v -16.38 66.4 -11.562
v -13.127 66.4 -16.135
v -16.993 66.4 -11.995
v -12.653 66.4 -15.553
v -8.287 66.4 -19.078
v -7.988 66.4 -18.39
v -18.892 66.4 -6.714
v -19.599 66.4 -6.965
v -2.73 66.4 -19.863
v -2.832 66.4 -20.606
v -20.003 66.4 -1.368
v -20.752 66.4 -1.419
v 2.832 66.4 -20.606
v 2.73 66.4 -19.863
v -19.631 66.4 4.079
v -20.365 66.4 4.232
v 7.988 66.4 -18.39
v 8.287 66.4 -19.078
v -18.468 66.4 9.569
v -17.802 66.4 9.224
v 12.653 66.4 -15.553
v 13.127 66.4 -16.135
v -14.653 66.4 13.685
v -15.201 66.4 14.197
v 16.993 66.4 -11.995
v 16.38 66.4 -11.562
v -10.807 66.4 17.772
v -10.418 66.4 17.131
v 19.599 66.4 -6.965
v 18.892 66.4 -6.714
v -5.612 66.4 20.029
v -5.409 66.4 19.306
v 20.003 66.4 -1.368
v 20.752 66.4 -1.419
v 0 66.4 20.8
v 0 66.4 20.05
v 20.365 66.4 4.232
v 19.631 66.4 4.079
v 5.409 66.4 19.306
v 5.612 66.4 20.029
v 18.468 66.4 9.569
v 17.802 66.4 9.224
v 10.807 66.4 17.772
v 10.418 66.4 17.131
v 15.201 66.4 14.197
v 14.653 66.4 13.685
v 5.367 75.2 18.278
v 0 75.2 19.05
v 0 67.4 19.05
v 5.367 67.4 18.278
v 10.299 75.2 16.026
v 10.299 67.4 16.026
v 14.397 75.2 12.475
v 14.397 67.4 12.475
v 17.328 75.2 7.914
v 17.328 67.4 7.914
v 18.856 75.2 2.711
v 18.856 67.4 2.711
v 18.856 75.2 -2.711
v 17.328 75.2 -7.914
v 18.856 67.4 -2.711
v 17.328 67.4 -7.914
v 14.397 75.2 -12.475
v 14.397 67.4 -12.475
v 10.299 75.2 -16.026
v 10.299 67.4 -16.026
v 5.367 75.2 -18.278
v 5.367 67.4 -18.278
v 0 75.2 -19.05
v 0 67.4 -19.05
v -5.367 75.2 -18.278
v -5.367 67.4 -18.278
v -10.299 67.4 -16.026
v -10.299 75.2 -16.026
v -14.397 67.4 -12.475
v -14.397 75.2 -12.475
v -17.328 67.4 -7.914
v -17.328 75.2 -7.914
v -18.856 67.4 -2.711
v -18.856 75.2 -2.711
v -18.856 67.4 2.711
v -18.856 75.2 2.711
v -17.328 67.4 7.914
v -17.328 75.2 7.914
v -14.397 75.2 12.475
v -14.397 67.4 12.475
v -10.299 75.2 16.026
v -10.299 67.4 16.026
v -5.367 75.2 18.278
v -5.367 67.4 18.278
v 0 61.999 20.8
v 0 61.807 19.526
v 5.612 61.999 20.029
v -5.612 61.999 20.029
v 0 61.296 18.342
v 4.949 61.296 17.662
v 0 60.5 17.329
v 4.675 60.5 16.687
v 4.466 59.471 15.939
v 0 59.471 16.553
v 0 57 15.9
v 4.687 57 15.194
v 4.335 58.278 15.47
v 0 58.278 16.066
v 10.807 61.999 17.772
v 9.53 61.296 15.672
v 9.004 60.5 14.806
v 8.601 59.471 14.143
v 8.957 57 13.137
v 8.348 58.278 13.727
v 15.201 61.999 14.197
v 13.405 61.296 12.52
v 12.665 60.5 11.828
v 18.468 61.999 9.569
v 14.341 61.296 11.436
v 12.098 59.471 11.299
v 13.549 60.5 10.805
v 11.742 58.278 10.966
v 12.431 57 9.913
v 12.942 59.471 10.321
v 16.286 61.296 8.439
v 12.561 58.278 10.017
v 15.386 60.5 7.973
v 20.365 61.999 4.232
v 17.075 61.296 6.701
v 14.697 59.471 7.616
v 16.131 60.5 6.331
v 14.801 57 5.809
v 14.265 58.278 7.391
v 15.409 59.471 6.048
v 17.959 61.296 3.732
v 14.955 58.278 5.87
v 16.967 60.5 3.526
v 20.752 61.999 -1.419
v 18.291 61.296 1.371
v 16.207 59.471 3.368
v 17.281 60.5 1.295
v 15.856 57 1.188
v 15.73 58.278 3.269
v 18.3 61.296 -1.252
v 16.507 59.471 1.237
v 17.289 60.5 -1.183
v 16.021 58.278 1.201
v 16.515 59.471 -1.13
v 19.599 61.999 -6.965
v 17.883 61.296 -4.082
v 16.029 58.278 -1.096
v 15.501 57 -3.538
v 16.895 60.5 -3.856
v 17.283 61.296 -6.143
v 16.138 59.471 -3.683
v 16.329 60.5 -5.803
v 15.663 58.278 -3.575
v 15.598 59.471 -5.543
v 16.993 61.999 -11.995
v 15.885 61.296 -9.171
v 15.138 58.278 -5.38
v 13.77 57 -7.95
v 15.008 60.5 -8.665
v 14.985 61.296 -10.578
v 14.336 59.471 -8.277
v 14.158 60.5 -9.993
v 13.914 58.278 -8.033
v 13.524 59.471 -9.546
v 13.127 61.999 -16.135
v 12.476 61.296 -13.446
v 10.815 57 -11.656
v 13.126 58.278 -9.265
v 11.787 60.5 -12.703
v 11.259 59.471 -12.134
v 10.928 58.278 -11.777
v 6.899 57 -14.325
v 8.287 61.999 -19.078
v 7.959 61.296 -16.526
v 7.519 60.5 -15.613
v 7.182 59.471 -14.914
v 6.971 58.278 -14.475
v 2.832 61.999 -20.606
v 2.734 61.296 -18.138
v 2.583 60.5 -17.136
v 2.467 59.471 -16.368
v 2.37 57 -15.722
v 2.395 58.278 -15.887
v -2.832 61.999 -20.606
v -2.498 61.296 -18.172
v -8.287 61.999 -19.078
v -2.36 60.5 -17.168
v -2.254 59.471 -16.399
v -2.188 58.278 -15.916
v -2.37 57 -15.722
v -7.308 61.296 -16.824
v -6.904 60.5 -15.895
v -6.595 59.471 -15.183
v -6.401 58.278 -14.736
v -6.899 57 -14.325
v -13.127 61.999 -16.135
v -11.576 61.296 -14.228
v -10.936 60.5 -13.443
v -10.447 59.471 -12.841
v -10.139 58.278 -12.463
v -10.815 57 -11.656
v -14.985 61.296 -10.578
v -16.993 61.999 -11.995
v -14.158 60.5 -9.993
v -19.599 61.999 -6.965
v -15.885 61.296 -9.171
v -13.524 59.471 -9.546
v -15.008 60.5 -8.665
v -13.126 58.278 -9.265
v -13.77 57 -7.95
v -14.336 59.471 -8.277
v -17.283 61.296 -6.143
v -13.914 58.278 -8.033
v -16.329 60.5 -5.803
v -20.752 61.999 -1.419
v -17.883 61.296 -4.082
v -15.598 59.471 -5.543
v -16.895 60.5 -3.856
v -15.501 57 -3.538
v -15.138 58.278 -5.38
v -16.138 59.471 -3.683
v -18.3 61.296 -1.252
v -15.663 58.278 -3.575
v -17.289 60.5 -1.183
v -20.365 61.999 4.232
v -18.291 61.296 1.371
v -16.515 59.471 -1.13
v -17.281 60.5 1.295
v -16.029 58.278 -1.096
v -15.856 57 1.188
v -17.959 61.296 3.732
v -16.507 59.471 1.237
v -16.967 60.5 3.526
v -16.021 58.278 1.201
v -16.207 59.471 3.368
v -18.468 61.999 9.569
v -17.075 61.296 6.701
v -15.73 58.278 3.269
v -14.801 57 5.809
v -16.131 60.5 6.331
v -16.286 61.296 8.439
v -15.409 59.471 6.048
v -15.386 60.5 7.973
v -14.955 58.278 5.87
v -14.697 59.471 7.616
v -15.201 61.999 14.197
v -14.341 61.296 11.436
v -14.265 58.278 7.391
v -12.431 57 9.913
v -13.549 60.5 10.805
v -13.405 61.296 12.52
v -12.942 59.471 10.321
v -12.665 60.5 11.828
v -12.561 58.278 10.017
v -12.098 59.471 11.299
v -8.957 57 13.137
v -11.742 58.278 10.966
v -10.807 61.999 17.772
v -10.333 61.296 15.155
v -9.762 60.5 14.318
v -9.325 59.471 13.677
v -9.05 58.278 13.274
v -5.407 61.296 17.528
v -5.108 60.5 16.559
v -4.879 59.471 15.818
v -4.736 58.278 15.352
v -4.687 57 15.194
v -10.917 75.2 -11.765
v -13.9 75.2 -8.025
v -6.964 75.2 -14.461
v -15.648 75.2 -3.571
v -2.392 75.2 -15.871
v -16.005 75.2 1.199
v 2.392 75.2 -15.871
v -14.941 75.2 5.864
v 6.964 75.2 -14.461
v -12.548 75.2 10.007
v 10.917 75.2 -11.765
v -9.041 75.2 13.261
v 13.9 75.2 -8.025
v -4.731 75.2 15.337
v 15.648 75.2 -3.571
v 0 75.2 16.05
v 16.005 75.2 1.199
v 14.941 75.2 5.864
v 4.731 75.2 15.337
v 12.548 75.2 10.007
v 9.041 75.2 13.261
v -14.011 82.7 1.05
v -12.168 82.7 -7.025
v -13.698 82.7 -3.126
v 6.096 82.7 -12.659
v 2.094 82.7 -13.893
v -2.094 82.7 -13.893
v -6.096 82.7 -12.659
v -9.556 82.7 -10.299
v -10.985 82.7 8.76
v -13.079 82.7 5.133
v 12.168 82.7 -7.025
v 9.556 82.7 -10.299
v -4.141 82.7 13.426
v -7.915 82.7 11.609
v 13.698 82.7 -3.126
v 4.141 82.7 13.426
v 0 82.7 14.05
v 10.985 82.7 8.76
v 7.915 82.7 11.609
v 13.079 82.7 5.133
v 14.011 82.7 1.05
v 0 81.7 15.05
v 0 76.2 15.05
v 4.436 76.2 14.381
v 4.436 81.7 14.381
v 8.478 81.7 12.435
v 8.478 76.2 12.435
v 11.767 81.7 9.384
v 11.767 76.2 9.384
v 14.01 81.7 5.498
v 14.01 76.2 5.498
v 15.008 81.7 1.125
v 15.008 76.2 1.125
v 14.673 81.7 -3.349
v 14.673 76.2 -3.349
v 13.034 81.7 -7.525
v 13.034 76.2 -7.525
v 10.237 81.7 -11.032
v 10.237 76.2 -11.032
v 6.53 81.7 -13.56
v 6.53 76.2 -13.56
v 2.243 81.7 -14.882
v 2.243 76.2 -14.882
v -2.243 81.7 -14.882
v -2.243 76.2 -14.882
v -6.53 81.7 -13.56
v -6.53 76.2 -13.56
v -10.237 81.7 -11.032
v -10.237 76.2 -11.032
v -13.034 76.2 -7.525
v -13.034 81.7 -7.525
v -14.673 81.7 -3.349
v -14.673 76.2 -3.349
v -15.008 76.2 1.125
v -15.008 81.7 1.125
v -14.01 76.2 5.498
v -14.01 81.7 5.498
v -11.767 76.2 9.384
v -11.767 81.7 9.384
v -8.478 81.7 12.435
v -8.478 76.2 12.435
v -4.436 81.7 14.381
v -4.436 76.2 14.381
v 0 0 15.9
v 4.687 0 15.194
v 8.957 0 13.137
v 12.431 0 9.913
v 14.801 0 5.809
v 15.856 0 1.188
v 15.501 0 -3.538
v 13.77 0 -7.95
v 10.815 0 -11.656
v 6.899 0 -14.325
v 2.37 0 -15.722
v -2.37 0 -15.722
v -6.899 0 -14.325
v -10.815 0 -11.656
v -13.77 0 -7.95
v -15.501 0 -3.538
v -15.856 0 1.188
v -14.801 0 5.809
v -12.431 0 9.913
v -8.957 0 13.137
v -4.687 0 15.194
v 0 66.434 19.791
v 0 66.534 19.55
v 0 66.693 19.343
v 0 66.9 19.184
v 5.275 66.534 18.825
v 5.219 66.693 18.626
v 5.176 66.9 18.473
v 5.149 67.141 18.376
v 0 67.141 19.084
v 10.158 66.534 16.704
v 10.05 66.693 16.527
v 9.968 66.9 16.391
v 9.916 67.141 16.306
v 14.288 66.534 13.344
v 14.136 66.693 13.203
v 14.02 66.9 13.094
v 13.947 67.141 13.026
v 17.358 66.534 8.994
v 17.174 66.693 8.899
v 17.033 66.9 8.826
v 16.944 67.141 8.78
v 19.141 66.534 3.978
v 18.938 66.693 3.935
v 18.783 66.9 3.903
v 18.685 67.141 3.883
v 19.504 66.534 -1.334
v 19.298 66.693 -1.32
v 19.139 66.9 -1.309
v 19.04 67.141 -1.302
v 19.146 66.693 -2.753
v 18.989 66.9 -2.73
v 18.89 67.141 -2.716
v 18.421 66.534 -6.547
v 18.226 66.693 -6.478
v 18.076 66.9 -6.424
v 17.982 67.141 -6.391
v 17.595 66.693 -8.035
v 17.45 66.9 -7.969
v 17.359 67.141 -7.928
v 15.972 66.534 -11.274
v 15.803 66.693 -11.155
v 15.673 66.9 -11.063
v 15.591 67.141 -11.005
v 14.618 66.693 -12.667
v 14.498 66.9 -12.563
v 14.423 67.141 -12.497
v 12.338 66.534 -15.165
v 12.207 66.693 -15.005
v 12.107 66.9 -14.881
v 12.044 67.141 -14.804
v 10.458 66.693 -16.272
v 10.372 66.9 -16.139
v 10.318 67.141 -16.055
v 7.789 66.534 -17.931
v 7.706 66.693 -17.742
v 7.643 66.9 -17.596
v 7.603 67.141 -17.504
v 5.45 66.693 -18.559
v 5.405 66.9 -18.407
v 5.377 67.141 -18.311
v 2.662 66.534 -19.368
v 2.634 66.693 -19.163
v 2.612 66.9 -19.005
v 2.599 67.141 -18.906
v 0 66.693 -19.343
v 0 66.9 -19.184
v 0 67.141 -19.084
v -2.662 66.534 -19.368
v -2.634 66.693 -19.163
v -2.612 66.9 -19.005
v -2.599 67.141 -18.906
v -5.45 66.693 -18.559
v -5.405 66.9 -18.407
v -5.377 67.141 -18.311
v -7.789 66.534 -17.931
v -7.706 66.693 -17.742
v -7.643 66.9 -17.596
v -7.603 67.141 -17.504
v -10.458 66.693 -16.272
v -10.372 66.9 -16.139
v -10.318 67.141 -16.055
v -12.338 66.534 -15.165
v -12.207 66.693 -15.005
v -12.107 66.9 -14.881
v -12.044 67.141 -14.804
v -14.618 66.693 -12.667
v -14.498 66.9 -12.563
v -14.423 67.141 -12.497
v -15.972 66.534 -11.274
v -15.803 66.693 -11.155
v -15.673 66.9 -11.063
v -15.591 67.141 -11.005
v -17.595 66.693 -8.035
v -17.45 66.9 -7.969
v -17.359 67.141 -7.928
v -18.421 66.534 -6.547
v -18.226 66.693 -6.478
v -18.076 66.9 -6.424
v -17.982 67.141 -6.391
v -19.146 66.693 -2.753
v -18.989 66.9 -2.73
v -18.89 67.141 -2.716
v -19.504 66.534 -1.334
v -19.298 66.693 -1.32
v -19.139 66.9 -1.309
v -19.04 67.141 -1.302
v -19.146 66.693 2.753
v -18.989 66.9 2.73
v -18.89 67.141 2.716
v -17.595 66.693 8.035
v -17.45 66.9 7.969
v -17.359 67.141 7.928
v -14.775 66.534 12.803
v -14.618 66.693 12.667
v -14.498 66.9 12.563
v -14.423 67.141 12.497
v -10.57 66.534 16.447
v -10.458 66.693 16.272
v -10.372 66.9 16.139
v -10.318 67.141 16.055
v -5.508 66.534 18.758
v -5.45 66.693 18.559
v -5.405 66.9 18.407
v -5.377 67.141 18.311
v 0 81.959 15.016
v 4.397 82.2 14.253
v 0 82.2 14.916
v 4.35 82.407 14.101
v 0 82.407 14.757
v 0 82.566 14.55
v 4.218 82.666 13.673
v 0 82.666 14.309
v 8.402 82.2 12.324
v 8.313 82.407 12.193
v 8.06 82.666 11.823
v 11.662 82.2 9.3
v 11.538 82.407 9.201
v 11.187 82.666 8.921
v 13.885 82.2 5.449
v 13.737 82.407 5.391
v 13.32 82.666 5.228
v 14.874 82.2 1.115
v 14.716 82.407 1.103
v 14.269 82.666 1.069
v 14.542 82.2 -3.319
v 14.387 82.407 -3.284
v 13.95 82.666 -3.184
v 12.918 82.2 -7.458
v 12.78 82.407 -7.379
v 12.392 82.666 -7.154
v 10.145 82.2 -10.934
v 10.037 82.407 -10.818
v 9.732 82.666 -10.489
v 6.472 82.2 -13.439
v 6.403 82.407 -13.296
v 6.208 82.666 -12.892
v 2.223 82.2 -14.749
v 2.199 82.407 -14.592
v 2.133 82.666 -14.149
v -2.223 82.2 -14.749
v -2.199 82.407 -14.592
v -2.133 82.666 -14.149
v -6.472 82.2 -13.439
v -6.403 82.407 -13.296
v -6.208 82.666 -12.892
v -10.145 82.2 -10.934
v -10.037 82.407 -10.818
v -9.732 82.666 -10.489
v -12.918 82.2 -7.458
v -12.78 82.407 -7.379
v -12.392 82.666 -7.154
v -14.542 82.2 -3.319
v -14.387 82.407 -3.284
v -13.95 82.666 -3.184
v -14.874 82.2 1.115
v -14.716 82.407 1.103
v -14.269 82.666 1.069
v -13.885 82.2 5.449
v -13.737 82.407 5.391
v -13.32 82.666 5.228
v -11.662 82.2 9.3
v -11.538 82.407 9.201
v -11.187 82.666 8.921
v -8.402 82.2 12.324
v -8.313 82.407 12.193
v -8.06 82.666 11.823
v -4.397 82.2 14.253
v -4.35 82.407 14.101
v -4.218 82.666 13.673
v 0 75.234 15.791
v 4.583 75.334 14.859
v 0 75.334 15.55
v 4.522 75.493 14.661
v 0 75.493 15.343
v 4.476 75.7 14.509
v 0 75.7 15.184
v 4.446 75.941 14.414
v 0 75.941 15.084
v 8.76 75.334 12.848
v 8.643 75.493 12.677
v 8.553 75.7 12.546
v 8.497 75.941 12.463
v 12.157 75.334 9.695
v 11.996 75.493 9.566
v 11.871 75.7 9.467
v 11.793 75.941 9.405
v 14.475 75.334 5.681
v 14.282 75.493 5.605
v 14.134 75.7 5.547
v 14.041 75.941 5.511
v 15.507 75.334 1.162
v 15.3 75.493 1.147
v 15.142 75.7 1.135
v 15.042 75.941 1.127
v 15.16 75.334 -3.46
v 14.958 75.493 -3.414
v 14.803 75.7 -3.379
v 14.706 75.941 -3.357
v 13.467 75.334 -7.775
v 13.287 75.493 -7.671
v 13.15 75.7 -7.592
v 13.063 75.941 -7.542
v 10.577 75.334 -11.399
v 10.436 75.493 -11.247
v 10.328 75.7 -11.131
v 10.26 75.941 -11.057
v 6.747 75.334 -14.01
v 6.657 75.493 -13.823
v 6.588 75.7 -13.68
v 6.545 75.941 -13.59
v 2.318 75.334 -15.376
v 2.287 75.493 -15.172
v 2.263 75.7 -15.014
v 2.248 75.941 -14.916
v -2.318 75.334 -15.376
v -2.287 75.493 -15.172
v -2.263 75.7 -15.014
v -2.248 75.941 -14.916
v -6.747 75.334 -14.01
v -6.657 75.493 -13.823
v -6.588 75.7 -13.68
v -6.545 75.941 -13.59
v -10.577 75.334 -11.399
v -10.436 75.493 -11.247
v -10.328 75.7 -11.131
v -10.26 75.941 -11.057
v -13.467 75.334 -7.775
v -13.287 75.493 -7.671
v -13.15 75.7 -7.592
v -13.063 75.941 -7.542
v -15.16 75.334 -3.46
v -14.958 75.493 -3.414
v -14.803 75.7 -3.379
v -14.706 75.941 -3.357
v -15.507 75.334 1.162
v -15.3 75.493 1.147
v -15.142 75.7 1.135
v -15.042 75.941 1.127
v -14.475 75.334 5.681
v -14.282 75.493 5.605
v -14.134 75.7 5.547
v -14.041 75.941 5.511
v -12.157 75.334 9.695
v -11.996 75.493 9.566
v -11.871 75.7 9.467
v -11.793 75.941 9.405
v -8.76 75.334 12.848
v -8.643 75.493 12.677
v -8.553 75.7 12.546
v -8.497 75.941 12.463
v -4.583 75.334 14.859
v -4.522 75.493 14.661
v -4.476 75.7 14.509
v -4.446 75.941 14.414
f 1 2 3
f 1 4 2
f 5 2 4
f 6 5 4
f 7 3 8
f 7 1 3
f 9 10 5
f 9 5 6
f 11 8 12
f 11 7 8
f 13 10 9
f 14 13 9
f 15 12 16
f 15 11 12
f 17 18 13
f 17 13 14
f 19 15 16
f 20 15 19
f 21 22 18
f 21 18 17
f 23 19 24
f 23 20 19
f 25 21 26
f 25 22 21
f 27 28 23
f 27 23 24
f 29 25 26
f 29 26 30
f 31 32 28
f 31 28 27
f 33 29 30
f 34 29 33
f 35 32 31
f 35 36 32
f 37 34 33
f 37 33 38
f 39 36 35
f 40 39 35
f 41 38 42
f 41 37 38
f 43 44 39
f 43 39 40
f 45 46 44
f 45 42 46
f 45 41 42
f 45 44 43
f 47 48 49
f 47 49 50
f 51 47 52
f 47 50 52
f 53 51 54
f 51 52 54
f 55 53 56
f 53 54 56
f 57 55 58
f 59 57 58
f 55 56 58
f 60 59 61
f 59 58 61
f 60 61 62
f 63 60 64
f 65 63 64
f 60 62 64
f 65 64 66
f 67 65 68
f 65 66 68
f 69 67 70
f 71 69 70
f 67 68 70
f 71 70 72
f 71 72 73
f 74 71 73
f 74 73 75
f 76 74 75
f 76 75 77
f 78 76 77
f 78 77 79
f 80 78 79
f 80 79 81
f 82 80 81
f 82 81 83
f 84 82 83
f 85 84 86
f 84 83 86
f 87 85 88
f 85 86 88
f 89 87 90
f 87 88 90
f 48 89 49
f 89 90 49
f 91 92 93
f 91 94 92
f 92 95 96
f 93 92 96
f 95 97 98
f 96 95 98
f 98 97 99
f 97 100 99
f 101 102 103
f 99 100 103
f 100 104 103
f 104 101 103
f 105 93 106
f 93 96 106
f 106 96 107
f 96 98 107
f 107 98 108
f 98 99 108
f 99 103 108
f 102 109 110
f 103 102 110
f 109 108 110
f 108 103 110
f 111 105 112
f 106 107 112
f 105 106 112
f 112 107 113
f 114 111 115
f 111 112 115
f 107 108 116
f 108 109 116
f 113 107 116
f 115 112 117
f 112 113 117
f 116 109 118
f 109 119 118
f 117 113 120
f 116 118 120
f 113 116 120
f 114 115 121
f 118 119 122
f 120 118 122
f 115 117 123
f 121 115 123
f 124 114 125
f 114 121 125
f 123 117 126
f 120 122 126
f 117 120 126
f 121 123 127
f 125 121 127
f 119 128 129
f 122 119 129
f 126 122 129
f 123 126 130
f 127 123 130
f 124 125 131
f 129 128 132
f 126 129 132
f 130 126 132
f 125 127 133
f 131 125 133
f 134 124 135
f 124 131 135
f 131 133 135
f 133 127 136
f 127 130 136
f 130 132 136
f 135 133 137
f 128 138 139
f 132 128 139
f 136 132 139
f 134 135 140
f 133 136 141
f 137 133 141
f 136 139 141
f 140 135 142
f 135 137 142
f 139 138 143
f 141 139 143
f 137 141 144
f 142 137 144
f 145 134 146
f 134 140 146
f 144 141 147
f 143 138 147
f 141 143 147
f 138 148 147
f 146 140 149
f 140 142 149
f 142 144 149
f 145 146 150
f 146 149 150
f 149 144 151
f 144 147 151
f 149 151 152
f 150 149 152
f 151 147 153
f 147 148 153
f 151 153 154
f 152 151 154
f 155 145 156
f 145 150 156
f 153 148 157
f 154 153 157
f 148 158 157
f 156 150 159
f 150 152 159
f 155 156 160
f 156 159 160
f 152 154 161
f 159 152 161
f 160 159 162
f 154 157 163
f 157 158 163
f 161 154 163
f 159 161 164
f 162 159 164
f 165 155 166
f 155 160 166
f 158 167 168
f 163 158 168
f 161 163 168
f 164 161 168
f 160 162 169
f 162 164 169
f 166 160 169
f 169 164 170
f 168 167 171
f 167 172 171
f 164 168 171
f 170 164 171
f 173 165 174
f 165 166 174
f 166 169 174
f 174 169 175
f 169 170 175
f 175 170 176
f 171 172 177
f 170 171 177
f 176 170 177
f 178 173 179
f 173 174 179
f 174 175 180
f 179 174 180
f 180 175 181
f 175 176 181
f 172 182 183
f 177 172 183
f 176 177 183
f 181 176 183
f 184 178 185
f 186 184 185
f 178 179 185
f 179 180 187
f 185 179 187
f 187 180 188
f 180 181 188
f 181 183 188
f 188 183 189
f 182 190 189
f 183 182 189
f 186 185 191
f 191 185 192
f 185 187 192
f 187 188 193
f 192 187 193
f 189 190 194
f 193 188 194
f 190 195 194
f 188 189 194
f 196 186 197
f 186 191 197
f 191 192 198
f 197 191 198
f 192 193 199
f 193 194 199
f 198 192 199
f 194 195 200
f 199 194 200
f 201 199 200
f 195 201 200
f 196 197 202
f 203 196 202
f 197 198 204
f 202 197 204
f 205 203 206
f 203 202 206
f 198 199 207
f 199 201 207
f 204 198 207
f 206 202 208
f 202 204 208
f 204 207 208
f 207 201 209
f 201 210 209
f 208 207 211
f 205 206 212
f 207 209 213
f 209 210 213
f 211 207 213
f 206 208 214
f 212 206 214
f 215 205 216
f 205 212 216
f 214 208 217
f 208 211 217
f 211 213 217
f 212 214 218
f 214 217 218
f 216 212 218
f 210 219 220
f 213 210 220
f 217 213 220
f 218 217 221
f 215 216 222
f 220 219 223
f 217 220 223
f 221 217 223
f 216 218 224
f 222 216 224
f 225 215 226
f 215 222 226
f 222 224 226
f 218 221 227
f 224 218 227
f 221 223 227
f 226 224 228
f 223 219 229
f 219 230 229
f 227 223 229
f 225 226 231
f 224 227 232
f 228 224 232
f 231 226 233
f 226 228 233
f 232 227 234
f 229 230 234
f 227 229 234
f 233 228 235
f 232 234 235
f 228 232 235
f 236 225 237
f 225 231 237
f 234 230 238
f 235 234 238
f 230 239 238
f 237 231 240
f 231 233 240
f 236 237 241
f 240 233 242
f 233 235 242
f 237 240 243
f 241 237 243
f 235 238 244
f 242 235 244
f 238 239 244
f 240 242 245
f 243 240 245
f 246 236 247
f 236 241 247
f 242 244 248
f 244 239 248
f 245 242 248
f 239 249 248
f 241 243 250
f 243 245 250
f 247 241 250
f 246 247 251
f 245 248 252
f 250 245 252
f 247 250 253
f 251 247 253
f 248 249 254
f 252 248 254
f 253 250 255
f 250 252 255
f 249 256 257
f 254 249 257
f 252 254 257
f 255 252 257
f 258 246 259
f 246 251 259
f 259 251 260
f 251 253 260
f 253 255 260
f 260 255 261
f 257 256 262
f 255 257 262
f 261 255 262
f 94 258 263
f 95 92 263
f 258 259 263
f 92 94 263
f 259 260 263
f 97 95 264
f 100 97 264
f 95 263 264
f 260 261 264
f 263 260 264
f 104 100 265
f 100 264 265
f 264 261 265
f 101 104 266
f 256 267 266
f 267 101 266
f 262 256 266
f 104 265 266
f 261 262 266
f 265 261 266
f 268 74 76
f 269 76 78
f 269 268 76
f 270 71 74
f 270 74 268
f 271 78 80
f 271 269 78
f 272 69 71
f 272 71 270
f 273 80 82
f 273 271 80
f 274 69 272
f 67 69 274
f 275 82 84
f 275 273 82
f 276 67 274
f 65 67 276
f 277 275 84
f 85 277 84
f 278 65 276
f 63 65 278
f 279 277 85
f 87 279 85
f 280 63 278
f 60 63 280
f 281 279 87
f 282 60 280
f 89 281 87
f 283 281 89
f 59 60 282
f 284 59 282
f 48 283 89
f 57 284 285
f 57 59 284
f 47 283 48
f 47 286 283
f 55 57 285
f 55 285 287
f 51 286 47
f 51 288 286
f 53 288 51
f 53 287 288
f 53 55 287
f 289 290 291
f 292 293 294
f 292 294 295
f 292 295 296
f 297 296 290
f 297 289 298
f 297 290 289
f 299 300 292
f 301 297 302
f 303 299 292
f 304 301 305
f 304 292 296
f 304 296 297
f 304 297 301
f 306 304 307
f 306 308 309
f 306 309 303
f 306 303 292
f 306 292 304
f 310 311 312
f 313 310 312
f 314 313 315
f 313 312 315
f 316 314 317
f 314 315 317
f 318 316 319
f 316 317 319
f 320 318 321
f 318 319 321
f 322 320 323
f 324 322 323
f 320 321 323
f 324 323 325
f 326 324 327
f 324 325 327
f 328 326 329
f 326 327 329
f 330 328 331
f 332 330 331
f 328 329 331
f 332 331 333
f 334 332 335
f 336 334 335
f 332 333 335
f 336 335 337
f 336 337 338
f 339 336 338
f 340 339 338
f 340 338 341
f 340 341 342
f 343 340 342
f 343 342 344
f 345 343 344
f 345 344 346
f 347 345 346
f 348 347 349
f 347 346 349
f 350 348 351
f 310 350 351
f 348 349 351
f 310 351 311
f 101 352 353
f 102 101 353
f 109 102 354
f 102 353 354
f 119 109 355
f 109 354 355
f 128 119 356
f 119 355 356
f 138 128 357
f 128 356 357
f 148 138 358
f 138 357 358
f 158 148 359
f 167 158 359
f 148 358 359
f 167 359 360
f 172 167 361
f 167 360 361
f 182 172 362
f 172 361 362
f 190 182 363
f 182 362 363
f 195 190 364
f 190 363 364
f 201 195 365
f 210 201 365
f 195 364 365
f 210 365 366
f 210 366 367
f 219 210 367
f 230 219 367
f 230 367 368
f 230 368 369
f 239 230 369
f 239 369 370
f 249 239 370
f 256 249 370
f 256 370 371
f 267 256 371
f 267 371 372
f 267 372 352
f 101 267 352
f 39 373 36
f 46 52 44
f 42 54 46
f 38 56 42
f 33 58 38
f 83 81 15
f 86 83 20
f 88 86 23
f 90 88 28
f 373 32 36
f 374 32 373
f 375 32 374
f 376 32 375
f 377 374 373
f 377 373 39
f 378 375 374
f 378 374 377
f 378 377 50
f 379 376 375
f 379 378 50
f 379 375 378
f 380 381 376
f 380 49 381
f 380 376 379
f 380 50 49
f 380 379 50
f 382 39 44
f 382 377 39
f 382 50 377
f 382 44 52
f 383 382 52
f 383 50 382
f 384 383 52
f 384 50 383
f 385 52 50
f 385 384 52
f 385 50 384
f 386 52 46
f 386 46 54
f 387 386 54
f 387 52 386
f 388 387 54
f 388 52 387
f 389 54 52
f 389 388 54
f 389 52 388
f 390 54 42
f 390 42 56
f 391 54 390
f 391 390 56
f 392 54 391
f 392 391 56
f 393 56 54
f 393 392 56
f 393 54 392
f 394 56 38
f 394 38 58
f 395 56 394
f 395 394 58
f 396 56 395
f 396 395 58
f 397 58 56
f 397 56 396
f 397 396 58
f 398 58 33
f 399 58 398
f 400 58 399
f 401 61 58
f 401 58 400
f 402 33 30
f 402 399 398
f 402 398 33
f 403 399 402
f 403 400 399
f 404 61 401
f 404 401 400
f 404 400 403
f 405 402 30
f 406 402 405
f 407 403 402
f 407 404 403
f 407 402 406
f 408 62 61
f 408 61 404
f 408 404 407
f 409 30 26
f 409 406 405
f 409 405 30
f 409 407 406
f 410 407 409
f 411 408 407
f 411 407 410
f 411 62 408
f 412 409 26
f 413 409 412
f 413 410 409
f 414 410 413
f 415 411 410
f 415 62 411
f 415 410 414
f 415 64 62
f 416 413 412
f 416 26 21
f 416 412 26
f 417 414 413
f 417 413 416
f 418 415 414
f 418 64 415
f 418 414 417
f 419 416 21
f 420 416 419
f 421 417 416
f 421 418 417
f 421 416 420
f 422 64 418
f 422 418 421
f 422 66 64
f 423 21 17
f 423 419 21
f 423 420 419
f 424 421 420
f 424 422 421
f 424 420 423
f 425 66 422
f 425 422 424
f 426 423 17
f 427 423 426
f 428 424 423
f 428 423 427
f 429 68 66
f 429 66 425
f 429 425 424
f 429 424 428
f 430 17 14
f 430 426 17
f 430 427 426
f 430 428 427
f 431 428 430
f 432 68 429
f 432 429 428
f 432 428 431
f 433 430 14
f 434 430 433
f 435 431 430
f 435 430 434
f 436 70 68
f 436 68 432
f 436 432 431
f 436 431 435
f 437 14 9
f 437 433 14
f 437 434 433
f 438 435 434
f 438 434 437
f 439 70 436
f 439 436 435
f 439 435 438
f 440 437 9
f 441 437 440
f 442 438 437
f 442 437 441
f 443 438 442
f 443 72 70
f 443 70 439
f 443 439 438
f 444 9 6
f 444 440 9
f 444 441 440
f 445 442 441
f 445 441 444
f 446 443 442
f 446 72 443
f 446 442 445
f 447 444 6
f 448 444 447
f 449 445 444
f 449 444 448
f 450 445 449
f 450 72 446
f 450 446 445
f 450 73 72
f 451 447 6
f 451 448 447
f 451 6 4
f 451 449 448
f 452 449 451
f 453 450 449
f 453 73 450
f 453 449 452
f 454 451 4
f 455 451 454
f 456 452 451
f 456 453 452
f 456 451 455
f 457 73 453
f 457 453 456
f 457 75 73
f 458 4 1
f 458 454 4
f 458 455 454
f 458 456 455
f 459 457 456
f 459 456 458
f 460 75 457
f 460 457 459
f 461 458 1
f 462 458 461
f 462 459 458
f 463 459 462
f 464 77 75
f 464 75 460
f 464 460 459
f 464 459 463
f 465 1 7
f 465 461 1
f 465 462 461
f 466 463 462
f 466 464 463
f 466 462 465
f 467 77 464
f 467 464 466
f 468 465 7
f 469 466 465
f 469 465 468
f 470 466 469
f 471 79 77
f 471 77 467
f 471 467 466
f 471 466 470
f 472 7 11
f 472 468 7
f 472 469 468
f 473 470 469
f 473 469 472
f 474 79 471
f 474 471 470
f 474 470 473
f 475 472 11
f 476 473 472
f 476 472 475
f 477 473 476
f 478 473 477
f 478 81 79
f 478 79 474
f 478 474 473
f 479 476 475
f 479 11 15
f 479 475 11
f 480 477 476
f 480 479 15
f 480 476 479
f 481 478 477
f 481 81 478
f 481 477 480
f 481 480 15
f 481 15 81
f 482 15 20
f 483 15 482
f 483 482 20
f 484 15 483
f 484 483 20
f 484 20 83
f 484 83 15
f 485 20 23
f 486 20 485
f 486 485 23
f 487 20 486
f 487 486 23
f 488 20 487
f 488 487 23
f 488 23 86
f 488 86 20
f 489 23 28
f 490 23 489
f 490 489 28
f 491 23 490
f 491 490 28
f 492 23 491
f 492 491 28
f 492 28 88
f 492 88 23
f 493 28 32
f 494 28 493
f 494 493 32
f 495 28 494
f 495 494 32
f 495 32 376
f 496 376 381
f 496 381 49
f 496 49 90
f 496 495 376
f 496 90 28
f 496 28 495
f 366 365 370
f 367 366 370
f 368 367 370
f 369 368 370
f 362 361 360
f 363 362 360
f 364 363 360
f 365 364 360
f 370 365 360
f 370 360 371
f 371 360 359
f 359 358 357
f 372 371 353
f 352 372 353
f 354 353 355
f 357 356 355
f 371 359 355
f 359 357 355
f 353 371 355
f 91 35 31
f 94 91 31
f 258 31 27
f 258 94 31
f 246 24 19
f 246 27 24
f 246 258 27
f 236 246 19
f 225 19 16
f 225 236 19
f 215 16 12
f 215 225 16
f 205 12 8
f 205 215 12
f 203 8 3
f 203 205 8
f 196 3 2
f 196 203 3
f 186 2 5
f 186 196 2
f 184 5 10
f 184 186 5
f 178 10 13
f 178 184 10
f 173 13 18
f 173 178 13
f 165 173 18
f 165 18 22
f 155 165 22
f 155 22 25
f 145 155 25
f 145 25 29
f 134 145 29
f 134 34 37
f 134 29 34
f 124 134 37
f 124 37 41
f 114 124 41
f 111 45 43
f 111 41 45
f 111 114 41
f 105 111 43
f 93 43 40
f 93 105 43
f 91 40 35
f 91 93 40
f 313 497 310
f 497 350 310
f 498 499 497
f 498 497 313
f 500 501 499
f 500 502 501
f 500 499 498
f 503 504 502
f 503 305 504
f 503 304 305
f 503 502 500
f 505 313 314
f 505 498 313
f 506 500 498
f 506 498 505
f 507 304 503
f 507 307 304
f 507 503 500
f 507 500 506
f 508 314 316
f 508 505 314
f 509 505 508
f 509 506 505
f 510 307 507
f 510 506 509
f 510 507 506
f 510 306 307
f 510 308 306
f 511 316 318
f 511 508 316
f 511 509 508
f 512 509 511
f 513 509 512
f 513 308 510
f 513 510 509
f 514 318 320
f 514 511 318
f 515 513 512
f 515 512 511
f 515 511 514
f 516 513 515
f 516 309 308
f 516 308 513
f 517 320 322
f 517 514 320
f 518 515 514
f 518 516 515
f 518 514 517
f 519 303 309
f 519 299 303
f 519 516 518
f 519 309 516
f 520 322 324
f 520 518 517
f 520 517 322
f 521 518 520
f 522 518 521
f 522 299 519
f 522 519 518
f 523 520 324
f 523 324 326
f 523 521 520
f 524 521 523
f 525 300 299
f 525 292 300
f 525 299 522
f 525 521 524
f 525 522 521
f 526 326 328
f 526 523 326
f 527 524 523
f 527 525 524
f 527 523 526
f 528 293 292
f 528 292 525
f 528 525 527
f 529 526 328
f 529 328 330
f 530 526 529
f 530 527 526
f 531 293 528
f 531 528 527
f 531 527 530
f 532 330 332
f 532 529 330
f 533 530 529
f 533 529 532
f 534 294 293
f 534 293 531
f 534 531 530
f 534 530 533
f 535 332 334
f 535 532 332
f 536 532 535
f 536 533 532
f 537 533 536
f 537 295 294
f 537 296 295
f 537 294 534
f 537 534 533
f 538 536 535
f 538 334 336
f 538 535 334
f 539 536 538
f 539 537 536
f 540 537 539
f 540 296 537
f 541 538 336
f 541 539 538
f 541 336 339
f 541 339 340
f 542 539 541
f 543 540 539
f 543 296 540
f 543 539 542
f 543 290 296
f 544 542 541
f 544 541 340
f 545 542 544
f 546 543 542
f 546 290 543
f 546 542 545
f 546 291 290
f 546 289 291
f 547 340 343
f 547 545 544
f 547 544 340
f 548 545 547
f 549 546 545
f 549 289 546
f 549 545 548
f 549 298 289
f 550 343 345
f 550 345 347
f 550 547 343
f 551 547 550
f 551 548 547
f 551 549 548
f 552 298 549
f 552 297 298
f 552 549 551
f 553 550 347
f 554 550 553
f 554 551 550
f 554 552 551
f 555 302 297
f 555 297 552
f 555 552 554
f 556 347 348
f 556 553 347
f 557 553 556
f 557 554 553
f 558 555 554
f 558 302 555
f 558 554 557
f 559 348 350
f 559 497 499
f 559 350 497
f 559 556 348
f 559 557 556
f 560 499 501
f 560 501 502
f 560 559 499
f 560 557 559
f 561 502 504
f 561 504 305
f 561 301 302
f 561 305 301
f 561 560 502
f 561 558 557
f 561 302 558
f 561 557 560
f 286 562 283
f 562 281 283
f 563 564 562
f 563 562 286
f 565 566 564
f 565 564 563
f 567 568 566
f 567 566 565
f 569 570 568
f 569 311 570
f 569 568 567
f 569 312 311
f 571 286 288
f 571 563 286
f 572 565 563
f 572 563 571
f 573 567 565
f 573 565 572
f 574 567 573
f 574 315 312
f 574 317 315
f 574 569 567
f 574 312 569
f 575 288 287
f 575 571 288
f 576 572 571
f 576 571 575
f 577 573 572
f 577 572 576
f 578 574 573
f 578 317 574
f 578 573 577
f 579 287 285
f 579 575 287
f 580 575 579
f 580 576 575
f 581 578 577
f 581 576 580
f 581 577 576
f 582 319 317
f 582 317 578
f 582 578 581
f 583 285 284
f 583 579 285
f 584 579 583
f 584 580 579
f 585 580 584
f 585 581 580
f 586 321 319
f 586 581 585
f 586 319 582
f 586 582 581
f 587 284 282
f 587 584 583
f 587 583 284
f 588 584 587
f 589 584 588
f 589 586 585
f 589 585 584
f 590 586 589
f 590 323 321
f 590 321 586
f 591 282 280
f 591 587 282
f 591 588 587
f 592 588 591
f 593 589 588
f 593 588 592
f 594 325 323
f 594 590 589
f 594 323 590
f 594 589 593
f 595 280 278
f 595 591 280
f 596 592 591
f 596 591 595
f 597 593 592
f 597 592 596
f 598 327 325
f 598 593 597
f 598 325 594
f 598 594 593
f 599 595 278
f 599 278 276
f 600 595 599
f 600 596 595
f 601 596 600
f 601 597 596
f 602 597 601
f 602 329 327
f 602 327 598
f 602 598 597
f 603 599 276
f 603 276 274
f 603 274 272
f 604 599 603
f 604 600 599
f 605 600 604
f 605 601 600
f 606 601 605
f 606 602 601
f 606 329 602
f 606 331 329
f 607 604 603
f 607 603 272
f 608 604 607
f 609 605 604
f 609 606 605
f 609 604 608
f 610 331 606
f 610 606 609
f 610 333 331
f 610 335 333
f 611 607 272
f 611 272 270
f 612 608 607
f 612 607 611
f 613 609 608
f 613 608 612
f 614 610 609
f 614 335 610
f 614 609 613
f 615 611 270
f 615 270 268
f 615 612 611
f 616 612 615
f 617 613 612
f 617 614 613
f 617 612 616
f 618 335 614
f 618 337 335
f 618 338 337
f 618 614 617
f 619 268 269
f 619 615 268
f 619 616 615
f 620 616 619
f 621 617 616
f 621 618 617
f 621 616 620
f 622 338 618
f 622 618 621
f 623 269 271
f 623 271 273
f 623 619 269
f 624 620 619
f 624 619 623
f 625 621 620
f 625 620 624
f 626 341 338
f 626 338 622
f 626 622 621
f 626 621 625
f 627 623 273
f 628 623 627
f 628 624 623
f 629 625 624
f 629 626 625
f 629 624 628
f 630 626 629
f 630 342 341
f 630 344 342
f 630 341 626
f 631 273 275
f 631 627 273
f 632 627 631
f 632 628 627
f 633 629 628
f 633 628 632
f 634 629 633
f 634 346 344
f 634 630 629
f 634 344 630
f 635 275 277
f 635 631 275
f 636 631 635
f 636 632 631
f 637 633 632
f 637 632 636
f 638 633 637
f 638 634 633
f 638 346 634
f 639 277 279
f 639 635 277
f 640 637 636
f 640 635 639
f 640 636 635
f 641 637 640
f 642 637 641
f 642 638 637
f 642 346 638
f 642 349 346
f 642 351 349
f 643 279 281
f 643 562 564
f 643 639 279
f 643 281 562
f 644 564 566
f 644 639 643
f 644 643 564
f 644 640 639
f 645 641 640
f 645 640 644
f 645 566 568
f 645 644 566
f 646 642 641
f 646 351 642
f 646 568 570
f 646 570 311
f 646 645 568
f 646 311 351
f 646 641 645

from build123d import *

# Parameters (mm, degrees)
SKETCH1_R           = 15.9
BOSS_EXTRUDE1_DEPTH = 62
SKETCH2_R           = 20.8
BOSS_EXTRUDE2_DEPTH = 4.4
SKETCH3_R           = 19.05
BOSS_EXTRUDE3_DEPTH = 8.8
SKETCH4_R           = 15.05
BOSS_EXTRUDE4_DEPTH = 7.5
FILLET1_R           = 5
FILLET2_R           = 1


with BuildPart() as part:
    # Sketch1 → Boss-Extrude1 (new body)
    with BuildSketch(Plane(origin=(0, 0, 0), x_dir=(1, 0, 0), z_dir=(0, 1, 0))):
        with Locations(Location((0, 0, 0), (0, 0, 270))):
            Circle(SKETCH1_R)
    extrude(amount=BOSS_EXTRUDE1_DEPTH)

    # Sketch2 → Boss-Extrude2 (add)
    with BuildSketch(Plane(origin=(0, 62, 0), x_dir=(1, 0, 0), z_dir=(0, 1, 0))):
        with Locations(Location((0, 0, 0), (0, 0, 270))):
            Circle(SKETCH2_R)
    extrude(amount=BOSS_EXTRUDE2_DEPTH)

    # Sketch3 → Boss-Extrude3 (add)
    with BuildSketch(Plane(origin=(0, 66.4, 0), x_dir=(1, 0, 0), z_dir=(0, 1, 0))):
        with Locations(Location((0, 0, 0), (0, 0, 270))):
            Circle(SKETCH3_R)
    extrude(amount=BOSS_EXTRUDE3_DEPTH)

    # Sketch4 → Boss-Extrude4 (add)
    with BuildSketch(Plane(origin=(0, 75.2, 0), x_dir=(1, 0, 0), z_dir=(0, 1, 0))):
        with Locations(Location((0, 0, 0), (0, 0, 270))):
            Circle(SKETCH4_R)
    extrude(amount=BOSS_EXTRUDE4_DEPTH)

    # Fillet1
    # the kernel refuses this fillet: 5 mm, written as the material it adds along each edge
    with BuildSketch(Plane(origin=(0, 62, 0), x_dir=(0, 0, 1), z_dir=(-1, 0, 0))) as fillet1_piece_1_section:
        with BuildLine():
            CenterArc((15.9 + FILLET1_R, -FILLET1_R), FILLET1_R, 90, 90)
            Line((15.9, -FILLET1_R), (15.9, 0))
            Line((15.9, 0), (15.9 + FILLET1_R, 0))
        make_face()
    fillet1_piece_1 = revolve(axis=Axis((0, 62, 0), (0, 1, 0)), mode=Mode.PRIVATE)
    fillet1_piece_1 = fillet1_piece_1 & Plane(origin=(0, 60.561583107, 0), x_dir=(0, 0, 1), z_dir=(0, -1, 0)) * Cylinder(20.8, 84, mode=Mode.PRIVATE)
    add(fillet1_piece_1)

    # Fillet2
    fillet2_edges = [part.edges().sort_by_distance(p)[0] for p in [
        (0, 75.2, -15.05),
        (0, 82.7, -15.05),
        (0, 66.4, -19.05),
    ]]
    fillet(fillet2_edges, radius=FILLET2_R)


solid = part.part
